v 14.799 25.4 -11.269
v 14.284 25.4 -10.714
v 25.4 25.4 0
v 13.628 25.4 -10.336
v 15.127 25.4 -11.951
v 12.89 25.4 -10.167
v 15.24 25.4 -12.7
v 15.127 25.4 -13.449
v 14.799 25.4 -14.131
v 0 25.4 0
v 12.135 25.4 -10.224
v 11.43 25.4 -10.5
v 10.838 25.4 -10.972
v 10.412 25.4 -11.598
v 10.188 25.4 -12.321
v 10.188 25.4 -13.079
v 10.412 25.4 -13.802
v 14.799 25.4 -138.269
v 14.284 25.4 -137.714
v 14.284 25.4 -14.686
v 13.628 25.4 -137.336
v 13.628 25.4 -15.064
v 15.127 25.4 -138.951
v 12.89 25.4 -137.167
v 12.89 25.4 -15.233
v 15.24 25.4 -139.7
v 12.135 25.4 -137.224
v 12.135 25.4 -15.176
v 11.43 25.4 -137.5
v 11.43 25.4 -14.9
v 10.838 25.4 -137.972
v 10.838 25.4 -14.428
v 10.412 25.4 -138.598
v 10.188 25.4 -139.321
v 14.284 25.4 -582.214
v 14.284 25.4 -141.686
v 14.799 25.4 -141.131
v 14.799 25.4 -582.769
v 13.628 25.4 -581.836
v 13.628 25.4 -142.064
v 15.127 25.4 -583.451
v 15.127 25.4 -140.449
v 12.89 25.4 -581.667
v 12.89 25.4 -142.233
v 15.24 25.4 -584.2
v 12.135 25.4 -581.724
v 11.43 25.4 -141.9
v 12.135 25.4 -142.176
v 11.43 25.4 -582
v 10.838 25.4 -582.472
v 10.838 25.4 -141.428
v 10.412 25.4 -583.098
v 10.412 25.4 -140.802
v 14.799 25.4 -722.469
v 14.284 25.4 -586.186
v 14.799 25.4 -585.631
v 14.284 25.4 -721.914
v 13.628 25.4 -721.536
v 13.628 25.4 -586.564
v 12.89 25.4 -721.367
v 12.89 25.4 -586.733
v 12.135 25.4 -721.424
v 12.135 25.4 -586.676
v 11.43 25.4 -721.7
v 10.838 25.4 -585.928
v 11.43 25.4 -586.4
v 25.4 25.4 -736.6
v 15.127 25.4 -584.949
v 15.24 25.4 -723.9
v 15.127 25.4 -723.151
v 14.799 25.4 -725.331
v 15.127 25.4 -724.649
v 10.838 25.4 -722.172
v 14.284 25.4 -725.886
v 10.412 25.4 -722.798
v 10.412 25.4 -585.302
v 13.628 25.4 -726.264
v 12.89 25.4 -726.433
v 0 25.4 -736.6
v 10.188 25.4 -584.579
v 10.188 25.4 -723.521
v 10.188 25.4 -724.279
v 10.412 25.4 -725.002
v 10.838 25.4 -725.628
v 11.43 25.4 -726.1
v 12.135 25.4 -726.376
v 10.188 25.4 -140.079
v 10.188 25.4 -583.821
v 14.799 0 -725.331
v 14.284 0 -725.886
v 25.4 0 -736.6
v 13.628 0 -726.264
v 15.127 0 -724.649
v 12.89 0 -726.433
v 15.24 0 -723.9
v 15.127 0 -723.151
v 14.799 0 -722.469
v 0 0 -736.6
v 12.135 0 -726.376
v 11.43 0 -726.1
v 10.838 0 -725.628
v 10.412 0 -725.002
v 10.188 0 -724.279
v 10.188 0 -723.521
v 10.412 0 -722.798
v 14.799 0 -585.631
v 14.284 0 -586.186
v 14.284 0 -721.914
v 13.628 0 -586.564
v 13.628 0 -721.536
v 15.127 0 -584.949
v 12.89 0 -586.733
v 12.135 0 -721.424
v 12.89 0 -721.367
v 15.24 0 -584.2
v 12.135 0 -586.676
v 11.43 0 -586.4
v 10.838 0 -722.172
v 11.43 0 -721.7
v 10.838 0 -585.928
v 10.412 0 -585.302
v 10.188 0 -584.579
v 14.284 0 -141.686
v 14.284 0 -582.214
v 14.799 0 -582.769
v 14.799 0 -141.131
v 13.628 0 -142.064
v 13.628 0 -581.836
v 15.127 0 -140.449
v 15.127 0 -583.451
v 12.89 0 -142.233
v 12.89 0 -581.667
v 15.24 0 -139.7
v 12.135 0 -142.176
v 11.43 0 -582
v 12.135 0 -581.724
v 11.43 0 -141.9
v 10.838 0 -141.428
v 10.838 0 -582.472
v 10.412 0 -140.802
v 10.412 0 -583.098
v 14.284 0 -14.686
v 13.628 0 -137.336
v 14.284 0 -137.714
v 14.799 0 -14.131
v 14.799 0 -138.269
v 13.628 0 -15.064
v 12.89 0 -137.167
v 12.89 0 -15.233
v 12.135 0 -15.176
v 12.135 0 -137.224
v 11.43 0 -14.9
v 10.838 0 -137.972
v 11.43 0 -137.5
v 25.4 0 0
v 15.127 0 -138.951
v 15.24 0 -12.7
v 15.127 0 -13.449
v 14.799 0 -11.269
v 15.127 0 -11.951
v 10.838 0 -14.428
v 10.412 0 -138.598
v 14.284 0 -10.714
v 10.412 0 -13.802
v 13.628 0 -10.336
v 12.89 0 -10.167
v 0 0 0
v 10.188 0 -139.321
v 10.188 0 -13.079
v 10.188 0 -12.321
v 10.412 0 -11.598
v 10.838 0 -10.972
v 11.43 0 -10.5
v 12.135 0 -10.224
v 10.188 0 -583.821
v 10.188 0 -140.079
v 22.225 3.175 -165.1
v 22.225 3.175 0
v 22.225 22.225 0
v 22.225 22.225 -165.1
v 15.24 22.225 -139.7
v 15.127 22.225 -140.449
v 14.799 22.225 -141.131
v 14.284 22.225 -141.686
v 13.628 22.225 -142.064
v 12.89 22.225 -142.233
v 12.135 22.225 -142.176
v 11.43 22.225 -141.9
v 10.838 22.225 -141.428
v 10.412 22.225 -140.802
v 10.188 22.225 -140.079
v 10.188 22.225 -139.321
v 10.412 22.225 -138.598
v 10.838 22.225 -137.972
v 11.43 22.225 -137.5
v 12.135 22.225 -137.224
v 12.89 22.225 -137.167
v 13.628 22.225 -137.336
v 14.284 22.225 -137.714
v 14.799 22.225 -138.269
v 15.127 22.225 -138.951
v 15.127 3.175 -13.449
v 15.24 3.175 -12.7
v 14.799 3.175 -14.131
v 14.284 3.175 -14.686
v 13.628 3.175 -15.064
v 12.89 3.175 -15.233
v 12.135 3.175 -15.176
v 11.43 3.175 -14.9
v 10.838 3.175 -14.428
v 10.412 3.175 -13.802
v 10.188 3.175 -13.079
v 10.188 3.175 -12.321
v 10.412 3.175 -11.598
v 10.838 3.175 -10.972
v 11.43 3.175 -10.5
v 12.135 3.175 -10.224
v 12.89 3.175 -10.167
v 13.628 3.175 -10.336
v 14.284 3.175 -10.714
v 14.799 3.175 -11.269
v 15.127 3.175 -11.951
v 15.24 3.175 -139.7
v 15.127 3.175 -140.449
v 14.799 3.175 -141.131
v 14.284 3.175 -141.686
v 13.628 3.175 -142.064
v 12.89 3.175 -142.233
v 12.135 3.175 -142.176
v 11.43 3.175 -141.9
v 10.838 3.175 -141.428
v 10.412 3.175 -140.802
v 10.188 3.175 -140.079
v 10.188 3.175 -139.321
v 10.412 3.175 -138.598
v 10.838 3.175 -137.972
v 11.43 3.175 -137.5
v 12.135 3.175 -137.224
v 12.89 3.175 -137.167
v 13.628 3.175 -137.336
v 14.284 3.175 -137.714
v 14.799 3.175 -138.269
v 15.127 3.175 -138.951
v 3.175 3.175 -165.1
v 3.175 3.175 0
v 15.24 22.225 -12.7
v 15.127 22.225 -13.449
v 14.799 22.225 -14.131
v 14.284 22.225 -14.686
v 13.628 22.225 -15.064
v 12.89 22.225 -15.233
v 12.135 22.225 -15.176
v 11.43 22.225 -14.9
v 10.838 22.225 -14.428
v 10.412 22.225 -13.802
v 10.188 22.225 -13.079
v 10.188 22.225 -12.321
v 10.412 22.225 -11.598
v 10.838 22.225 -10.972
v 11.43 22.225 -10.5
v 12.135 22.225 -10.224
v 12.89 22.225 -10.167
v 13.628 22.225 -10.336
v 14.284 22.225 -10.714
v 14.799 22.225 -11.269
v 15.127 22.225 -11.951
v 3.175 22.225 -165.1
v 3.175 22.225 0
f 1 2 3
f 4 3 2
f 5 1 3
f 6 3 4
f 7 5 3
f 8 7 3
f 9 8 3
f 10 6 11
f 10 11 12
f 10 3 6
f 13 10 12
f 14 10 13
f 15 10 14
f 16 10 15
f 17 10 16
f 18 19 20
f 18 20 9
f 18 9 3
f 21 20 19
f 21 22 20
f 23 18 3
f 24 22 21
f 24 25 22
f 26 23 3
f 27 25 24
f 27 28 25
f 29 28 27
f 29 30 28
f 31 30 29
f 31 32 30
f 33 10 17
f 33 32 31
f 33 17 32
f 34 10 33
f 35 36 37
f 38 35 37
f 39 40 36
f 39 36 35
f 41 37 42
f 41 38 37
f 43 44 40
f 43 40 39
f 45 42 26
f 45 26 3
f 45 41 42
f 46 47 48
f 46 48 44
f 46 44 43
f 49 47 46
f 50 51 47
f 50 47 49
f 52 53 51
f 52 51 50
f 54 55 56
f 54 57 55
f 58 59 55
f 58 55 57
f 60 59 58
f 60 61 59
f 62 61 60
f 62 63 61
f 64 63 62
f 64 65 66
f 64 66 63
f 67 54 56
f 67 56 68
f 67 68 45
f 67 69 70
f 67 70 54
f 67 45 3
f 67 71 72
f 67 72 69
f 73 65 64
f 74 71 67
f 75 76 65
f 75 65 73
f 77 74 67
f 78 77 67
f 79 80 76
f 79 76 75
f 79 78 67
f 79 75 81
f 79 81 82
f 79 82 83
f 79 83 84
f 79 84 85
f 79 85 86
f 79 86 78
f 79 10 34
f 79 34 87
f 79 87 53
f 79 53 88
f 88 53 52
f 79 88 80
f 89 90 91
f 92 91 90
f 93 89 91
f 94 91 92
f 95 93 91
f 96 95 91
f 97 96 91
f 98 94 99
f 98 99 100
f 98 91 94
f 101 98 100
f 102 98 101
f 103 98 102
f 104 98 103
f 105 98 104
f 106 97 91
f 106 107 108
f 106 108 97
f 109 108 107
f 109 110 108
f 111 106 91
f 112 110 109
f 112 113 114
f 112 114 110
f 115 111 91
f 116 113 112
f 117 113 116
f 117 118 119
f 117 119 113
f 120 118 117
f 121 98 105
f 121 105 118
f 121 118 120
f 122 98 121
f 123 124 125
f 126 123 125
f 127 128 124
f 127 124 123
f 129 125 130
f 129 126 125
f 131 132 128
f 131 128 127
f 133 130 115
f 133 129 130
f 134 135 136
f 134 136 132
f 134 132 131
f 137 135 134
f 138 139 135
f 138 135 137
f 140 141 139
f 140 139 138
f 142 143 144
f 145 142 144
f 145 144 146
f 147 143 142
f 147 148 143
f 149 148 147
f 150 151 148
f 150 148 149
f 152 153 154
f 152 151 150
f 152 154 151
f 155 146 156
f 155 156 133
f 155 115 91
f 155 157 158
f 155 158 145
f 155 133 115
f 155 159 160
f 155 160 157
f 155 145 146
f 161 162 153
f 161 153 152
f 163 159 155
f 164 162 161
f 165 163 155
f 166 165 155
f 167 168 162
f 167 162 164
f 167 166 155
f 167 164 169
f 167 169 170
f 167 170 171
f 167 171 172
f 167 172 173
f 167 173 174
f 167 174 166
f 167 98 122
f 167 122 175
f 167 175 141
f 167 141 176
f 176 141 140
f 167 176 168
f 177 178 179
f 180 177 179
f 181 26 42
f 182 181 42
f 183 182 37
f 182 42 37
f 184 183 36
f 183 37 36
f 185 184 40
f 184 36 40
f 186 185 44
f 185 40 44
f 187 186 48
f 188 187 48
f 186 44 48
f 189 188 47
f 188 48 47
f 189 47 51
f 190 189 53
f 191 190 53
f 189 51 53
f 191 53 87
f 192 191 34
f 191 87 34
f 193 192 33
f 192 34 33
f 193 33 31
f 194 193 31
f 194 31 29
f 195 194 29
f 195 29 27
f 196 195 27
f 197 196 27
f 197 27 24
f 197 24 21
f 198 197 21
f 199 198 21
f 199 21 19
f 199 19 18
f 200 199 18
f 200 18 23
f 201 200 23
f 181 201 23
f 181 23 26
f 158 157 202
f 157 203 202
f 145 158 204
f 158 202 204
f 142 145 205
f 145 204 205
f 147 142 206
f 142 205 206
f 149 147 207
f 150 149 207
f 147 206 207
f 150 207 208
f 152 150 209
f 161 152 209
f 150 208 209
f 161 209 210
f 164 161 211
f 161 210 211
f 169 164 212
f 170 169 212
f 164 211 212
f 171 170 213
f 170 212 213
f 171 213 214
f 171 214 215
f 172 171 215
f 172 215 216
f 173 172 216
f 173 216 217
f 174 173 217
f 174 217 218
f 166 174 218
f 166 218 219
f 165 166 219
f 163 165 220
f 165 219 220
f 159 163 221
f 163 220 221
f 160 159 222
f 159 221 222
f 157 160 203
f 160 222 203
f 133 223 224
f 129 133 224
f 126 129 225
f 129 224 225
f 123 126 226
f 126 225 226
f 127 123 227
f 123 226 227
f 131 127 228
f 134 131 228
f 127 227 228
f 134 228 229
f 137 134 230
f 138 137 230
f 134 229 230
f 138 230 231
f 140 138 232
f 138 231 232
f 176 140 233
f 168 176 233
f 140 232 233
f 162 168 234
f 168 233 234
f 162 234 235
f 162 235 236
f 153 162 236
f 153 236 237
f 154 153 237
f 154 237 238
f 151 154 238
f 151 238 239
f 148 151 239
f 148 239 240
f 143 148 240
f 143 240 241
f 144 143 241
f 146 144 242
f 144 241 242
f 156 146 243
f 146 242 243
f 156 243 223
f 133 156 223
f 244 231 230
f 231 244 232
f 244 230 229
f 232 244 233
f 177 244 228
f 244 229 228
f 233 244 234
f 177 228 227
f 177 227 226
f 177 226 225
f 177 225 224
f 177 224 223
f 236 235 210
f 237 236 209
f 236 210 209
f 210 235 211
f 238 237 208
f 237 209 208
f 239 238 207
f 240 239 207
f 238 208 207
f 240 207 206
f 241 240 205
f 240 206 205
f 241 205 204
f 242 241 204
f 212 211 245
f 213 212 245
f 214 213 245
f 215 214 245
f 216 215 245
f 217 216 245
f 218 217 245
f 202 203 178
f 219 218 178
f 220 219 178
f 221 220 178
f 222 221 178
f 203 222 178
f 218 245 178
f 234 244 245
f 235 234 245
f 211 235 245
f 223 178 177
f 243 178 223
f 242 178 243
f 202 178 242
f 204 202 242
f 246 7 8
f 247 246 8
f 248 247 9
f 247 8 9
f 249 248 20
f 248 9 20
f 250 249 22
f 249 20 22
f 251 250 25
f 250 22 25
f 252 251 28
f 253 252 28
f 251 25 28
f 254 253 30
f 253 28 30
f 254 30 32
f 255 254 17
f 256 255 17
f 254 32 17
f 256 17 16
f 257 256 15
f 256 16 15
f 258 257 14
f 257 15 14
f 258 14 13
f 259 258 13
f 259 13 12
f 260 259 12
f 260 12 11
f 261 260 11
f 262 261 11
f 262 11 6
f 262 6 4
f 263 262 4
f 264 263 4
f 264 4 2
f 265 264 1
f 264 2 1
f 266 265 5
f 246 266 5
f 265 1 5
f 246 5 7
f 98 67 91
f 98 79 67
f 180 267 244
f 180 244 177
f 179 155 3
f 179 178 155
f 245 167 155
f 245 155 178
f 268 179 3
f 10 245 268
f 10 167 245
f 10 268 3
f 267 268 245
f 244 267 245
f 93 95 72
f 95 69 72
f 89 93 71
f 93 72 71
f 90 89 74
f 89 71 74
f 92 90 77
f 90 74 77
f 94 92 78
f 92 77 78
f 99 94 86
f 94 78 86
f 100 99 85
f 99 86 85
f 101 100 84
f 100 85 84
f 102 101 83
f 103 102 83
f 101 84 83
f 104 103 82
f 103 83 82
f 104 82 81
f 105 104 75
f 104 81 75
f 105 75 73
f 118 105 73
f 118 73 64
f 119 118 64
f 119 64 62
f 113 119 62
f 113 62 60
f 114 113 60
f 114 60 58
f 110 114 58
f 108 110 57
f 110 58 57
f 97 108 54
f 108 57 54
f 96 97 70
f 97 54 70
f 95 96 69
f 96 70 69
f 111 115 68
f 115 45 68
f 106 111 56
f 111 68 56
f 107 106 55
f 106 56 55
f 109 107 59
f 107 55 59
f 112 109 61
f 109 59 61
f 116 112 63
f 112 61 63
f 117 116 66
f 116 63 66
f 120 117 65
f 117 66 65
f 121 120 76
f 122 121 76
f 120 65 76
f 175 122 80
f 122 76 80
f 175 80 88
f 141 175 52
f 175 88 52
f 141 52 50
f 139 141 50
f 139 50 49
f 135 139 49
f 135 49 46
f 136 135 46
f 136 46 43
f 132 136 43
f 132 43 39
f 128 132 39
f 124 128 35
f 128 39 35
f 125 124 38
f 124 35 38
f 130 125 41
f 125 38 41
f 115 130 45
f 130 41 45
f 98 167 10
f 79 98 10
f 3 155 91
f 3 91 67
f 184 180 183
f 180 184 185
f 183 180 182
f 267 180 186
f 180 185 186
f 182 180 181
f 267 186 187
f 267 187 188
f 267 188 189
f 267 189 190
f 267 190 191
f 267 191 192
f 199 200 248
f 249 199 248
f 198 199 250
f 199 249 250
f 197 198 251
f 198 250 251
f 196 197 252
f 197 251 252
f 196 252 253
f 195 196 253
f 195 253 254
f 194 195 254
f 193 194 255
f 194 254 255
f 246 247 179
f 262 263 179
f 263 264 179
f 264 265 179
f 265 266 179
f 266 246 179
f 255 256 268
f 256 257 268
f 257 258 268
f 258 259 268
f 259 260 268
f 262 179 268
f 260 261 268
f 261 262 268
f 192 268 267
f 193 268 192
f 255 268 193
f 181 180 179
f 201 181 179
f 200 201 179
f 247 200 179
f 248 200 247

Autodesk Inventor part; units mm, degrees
ref_plane "YZ Plane" through (0, 0, 0) normal (1, 0, 0) x (0, 1, 0)
ref_plane "XZ Plane" through (0, 0, 0) normal (0, 1, 0) x (-1, 0, 0)
ref_plane "XY Plane" through (0, 0, 0) normal (0, 0, 1) x (1, 0, 0)
sketch "Sketch1" plane through (0, 0, 0) normal (1, 0, 0) x (0, 1, 0)
  line L0 (0, 0) -> (25.4, 0)
  line L1 (25.4, 0) -> (25.4, -736.6)
  line L2 (25.4, -736.6) -> (0, -736.6)
  line L3 (0, -736.6) -> (0, 0)
  dimension "d0" = 25.4
  dimension "d1" = 736.6
extrude "Extrusion1" add sketch "Sketch1" along normal blind 25.4
sketch "Sketch2" plane through (0, 0, 0) normal (0, 0, 1) x (1, 0, 0)
  line L0 (3.175, 3.175) -> (22.225, 3.175)
  line L1 (22.225, 3.175) -> (22.225, 22.225)
  line L2 (22.225, 22.225) -> (3.175, 22.225)
  line L3 (3.175, 22.225) -> (3.175, 3.175)
  line L4 (0, 25.4) -> (25.4, 25.4) projected
  line L5 (0, 0) -> (0, 25.4) projected
  dimension "d4" = 3.175
  dimension "d5" = 3.175
  dimension "d6" = 19.05
  dimension "d7" = 19.05
extrude "Extrusion2" cut sketch "Sketch2" against normal blind 165.1
sketch "Sketch3" plane through (0, 25.4, 0) normal (0, 1, 0) x (1, 0, 0)
  line L0 (0, 0) -> (0, 736.6) projected
  line L1 (0, 0) -> (12.7, 0)
  line L2 (0, 0) -> (25.4, 0) projected
  line L3 (12.7, 0) -> (12.7, 152.4)
  line L4 (22.225, 152.4) -> (3.175, 152.4) projected
  line L5 (12.7, 152.4) -> (12.7, 139.7)
  line L6 (12.7, 0) -> (12.7, 12.7)
  circle A0 centre (12.7, 12.7) radius 2.54
  circle A1 centre (12.7, 139.7) radius 2.54
  dimension "d10" = 152.4
  dimension "d11" = 12.7
  dimension "d12" = 12.7
  dimension "d13" = 5.08
extrude "Extrusion3" cut sketch "Sketch3" against normal blind 25.4
sketch "Sketch4" plane through (0, 25.4, 0) normal (0, 1, 0) x (1, 0, 0)
  line L0 (0, 736.6) -> (25.4, 736.6) projected
  line L1 (12.7, 736.6) -> (0, 736.6)
  line L2 (12.7, 736.6) -> (12.7, 723.9)
  line L3 (12.7, 723.9) -> (12.7, 571.5)
  line L4 (12.7, 571.5) -> (12.7, 584.2)
  circle A0 centre (12.7, 584.2) radius 2.54
  circle A1 centre (12.7, 723.9) radius 2.54
  point P0 (0, 0)
  dimension "d16" = 12.7
  dimension "d17" = 12.7
  dimension "d18" = 152.4
  dimension "d19" = 12.7
  dimension "d20" = 5.08
extrude "Extrusion4" cut sketch "Sketch4" against normal blind 25.4
properties part number "1by1by6" material "Aluminum 6061"
